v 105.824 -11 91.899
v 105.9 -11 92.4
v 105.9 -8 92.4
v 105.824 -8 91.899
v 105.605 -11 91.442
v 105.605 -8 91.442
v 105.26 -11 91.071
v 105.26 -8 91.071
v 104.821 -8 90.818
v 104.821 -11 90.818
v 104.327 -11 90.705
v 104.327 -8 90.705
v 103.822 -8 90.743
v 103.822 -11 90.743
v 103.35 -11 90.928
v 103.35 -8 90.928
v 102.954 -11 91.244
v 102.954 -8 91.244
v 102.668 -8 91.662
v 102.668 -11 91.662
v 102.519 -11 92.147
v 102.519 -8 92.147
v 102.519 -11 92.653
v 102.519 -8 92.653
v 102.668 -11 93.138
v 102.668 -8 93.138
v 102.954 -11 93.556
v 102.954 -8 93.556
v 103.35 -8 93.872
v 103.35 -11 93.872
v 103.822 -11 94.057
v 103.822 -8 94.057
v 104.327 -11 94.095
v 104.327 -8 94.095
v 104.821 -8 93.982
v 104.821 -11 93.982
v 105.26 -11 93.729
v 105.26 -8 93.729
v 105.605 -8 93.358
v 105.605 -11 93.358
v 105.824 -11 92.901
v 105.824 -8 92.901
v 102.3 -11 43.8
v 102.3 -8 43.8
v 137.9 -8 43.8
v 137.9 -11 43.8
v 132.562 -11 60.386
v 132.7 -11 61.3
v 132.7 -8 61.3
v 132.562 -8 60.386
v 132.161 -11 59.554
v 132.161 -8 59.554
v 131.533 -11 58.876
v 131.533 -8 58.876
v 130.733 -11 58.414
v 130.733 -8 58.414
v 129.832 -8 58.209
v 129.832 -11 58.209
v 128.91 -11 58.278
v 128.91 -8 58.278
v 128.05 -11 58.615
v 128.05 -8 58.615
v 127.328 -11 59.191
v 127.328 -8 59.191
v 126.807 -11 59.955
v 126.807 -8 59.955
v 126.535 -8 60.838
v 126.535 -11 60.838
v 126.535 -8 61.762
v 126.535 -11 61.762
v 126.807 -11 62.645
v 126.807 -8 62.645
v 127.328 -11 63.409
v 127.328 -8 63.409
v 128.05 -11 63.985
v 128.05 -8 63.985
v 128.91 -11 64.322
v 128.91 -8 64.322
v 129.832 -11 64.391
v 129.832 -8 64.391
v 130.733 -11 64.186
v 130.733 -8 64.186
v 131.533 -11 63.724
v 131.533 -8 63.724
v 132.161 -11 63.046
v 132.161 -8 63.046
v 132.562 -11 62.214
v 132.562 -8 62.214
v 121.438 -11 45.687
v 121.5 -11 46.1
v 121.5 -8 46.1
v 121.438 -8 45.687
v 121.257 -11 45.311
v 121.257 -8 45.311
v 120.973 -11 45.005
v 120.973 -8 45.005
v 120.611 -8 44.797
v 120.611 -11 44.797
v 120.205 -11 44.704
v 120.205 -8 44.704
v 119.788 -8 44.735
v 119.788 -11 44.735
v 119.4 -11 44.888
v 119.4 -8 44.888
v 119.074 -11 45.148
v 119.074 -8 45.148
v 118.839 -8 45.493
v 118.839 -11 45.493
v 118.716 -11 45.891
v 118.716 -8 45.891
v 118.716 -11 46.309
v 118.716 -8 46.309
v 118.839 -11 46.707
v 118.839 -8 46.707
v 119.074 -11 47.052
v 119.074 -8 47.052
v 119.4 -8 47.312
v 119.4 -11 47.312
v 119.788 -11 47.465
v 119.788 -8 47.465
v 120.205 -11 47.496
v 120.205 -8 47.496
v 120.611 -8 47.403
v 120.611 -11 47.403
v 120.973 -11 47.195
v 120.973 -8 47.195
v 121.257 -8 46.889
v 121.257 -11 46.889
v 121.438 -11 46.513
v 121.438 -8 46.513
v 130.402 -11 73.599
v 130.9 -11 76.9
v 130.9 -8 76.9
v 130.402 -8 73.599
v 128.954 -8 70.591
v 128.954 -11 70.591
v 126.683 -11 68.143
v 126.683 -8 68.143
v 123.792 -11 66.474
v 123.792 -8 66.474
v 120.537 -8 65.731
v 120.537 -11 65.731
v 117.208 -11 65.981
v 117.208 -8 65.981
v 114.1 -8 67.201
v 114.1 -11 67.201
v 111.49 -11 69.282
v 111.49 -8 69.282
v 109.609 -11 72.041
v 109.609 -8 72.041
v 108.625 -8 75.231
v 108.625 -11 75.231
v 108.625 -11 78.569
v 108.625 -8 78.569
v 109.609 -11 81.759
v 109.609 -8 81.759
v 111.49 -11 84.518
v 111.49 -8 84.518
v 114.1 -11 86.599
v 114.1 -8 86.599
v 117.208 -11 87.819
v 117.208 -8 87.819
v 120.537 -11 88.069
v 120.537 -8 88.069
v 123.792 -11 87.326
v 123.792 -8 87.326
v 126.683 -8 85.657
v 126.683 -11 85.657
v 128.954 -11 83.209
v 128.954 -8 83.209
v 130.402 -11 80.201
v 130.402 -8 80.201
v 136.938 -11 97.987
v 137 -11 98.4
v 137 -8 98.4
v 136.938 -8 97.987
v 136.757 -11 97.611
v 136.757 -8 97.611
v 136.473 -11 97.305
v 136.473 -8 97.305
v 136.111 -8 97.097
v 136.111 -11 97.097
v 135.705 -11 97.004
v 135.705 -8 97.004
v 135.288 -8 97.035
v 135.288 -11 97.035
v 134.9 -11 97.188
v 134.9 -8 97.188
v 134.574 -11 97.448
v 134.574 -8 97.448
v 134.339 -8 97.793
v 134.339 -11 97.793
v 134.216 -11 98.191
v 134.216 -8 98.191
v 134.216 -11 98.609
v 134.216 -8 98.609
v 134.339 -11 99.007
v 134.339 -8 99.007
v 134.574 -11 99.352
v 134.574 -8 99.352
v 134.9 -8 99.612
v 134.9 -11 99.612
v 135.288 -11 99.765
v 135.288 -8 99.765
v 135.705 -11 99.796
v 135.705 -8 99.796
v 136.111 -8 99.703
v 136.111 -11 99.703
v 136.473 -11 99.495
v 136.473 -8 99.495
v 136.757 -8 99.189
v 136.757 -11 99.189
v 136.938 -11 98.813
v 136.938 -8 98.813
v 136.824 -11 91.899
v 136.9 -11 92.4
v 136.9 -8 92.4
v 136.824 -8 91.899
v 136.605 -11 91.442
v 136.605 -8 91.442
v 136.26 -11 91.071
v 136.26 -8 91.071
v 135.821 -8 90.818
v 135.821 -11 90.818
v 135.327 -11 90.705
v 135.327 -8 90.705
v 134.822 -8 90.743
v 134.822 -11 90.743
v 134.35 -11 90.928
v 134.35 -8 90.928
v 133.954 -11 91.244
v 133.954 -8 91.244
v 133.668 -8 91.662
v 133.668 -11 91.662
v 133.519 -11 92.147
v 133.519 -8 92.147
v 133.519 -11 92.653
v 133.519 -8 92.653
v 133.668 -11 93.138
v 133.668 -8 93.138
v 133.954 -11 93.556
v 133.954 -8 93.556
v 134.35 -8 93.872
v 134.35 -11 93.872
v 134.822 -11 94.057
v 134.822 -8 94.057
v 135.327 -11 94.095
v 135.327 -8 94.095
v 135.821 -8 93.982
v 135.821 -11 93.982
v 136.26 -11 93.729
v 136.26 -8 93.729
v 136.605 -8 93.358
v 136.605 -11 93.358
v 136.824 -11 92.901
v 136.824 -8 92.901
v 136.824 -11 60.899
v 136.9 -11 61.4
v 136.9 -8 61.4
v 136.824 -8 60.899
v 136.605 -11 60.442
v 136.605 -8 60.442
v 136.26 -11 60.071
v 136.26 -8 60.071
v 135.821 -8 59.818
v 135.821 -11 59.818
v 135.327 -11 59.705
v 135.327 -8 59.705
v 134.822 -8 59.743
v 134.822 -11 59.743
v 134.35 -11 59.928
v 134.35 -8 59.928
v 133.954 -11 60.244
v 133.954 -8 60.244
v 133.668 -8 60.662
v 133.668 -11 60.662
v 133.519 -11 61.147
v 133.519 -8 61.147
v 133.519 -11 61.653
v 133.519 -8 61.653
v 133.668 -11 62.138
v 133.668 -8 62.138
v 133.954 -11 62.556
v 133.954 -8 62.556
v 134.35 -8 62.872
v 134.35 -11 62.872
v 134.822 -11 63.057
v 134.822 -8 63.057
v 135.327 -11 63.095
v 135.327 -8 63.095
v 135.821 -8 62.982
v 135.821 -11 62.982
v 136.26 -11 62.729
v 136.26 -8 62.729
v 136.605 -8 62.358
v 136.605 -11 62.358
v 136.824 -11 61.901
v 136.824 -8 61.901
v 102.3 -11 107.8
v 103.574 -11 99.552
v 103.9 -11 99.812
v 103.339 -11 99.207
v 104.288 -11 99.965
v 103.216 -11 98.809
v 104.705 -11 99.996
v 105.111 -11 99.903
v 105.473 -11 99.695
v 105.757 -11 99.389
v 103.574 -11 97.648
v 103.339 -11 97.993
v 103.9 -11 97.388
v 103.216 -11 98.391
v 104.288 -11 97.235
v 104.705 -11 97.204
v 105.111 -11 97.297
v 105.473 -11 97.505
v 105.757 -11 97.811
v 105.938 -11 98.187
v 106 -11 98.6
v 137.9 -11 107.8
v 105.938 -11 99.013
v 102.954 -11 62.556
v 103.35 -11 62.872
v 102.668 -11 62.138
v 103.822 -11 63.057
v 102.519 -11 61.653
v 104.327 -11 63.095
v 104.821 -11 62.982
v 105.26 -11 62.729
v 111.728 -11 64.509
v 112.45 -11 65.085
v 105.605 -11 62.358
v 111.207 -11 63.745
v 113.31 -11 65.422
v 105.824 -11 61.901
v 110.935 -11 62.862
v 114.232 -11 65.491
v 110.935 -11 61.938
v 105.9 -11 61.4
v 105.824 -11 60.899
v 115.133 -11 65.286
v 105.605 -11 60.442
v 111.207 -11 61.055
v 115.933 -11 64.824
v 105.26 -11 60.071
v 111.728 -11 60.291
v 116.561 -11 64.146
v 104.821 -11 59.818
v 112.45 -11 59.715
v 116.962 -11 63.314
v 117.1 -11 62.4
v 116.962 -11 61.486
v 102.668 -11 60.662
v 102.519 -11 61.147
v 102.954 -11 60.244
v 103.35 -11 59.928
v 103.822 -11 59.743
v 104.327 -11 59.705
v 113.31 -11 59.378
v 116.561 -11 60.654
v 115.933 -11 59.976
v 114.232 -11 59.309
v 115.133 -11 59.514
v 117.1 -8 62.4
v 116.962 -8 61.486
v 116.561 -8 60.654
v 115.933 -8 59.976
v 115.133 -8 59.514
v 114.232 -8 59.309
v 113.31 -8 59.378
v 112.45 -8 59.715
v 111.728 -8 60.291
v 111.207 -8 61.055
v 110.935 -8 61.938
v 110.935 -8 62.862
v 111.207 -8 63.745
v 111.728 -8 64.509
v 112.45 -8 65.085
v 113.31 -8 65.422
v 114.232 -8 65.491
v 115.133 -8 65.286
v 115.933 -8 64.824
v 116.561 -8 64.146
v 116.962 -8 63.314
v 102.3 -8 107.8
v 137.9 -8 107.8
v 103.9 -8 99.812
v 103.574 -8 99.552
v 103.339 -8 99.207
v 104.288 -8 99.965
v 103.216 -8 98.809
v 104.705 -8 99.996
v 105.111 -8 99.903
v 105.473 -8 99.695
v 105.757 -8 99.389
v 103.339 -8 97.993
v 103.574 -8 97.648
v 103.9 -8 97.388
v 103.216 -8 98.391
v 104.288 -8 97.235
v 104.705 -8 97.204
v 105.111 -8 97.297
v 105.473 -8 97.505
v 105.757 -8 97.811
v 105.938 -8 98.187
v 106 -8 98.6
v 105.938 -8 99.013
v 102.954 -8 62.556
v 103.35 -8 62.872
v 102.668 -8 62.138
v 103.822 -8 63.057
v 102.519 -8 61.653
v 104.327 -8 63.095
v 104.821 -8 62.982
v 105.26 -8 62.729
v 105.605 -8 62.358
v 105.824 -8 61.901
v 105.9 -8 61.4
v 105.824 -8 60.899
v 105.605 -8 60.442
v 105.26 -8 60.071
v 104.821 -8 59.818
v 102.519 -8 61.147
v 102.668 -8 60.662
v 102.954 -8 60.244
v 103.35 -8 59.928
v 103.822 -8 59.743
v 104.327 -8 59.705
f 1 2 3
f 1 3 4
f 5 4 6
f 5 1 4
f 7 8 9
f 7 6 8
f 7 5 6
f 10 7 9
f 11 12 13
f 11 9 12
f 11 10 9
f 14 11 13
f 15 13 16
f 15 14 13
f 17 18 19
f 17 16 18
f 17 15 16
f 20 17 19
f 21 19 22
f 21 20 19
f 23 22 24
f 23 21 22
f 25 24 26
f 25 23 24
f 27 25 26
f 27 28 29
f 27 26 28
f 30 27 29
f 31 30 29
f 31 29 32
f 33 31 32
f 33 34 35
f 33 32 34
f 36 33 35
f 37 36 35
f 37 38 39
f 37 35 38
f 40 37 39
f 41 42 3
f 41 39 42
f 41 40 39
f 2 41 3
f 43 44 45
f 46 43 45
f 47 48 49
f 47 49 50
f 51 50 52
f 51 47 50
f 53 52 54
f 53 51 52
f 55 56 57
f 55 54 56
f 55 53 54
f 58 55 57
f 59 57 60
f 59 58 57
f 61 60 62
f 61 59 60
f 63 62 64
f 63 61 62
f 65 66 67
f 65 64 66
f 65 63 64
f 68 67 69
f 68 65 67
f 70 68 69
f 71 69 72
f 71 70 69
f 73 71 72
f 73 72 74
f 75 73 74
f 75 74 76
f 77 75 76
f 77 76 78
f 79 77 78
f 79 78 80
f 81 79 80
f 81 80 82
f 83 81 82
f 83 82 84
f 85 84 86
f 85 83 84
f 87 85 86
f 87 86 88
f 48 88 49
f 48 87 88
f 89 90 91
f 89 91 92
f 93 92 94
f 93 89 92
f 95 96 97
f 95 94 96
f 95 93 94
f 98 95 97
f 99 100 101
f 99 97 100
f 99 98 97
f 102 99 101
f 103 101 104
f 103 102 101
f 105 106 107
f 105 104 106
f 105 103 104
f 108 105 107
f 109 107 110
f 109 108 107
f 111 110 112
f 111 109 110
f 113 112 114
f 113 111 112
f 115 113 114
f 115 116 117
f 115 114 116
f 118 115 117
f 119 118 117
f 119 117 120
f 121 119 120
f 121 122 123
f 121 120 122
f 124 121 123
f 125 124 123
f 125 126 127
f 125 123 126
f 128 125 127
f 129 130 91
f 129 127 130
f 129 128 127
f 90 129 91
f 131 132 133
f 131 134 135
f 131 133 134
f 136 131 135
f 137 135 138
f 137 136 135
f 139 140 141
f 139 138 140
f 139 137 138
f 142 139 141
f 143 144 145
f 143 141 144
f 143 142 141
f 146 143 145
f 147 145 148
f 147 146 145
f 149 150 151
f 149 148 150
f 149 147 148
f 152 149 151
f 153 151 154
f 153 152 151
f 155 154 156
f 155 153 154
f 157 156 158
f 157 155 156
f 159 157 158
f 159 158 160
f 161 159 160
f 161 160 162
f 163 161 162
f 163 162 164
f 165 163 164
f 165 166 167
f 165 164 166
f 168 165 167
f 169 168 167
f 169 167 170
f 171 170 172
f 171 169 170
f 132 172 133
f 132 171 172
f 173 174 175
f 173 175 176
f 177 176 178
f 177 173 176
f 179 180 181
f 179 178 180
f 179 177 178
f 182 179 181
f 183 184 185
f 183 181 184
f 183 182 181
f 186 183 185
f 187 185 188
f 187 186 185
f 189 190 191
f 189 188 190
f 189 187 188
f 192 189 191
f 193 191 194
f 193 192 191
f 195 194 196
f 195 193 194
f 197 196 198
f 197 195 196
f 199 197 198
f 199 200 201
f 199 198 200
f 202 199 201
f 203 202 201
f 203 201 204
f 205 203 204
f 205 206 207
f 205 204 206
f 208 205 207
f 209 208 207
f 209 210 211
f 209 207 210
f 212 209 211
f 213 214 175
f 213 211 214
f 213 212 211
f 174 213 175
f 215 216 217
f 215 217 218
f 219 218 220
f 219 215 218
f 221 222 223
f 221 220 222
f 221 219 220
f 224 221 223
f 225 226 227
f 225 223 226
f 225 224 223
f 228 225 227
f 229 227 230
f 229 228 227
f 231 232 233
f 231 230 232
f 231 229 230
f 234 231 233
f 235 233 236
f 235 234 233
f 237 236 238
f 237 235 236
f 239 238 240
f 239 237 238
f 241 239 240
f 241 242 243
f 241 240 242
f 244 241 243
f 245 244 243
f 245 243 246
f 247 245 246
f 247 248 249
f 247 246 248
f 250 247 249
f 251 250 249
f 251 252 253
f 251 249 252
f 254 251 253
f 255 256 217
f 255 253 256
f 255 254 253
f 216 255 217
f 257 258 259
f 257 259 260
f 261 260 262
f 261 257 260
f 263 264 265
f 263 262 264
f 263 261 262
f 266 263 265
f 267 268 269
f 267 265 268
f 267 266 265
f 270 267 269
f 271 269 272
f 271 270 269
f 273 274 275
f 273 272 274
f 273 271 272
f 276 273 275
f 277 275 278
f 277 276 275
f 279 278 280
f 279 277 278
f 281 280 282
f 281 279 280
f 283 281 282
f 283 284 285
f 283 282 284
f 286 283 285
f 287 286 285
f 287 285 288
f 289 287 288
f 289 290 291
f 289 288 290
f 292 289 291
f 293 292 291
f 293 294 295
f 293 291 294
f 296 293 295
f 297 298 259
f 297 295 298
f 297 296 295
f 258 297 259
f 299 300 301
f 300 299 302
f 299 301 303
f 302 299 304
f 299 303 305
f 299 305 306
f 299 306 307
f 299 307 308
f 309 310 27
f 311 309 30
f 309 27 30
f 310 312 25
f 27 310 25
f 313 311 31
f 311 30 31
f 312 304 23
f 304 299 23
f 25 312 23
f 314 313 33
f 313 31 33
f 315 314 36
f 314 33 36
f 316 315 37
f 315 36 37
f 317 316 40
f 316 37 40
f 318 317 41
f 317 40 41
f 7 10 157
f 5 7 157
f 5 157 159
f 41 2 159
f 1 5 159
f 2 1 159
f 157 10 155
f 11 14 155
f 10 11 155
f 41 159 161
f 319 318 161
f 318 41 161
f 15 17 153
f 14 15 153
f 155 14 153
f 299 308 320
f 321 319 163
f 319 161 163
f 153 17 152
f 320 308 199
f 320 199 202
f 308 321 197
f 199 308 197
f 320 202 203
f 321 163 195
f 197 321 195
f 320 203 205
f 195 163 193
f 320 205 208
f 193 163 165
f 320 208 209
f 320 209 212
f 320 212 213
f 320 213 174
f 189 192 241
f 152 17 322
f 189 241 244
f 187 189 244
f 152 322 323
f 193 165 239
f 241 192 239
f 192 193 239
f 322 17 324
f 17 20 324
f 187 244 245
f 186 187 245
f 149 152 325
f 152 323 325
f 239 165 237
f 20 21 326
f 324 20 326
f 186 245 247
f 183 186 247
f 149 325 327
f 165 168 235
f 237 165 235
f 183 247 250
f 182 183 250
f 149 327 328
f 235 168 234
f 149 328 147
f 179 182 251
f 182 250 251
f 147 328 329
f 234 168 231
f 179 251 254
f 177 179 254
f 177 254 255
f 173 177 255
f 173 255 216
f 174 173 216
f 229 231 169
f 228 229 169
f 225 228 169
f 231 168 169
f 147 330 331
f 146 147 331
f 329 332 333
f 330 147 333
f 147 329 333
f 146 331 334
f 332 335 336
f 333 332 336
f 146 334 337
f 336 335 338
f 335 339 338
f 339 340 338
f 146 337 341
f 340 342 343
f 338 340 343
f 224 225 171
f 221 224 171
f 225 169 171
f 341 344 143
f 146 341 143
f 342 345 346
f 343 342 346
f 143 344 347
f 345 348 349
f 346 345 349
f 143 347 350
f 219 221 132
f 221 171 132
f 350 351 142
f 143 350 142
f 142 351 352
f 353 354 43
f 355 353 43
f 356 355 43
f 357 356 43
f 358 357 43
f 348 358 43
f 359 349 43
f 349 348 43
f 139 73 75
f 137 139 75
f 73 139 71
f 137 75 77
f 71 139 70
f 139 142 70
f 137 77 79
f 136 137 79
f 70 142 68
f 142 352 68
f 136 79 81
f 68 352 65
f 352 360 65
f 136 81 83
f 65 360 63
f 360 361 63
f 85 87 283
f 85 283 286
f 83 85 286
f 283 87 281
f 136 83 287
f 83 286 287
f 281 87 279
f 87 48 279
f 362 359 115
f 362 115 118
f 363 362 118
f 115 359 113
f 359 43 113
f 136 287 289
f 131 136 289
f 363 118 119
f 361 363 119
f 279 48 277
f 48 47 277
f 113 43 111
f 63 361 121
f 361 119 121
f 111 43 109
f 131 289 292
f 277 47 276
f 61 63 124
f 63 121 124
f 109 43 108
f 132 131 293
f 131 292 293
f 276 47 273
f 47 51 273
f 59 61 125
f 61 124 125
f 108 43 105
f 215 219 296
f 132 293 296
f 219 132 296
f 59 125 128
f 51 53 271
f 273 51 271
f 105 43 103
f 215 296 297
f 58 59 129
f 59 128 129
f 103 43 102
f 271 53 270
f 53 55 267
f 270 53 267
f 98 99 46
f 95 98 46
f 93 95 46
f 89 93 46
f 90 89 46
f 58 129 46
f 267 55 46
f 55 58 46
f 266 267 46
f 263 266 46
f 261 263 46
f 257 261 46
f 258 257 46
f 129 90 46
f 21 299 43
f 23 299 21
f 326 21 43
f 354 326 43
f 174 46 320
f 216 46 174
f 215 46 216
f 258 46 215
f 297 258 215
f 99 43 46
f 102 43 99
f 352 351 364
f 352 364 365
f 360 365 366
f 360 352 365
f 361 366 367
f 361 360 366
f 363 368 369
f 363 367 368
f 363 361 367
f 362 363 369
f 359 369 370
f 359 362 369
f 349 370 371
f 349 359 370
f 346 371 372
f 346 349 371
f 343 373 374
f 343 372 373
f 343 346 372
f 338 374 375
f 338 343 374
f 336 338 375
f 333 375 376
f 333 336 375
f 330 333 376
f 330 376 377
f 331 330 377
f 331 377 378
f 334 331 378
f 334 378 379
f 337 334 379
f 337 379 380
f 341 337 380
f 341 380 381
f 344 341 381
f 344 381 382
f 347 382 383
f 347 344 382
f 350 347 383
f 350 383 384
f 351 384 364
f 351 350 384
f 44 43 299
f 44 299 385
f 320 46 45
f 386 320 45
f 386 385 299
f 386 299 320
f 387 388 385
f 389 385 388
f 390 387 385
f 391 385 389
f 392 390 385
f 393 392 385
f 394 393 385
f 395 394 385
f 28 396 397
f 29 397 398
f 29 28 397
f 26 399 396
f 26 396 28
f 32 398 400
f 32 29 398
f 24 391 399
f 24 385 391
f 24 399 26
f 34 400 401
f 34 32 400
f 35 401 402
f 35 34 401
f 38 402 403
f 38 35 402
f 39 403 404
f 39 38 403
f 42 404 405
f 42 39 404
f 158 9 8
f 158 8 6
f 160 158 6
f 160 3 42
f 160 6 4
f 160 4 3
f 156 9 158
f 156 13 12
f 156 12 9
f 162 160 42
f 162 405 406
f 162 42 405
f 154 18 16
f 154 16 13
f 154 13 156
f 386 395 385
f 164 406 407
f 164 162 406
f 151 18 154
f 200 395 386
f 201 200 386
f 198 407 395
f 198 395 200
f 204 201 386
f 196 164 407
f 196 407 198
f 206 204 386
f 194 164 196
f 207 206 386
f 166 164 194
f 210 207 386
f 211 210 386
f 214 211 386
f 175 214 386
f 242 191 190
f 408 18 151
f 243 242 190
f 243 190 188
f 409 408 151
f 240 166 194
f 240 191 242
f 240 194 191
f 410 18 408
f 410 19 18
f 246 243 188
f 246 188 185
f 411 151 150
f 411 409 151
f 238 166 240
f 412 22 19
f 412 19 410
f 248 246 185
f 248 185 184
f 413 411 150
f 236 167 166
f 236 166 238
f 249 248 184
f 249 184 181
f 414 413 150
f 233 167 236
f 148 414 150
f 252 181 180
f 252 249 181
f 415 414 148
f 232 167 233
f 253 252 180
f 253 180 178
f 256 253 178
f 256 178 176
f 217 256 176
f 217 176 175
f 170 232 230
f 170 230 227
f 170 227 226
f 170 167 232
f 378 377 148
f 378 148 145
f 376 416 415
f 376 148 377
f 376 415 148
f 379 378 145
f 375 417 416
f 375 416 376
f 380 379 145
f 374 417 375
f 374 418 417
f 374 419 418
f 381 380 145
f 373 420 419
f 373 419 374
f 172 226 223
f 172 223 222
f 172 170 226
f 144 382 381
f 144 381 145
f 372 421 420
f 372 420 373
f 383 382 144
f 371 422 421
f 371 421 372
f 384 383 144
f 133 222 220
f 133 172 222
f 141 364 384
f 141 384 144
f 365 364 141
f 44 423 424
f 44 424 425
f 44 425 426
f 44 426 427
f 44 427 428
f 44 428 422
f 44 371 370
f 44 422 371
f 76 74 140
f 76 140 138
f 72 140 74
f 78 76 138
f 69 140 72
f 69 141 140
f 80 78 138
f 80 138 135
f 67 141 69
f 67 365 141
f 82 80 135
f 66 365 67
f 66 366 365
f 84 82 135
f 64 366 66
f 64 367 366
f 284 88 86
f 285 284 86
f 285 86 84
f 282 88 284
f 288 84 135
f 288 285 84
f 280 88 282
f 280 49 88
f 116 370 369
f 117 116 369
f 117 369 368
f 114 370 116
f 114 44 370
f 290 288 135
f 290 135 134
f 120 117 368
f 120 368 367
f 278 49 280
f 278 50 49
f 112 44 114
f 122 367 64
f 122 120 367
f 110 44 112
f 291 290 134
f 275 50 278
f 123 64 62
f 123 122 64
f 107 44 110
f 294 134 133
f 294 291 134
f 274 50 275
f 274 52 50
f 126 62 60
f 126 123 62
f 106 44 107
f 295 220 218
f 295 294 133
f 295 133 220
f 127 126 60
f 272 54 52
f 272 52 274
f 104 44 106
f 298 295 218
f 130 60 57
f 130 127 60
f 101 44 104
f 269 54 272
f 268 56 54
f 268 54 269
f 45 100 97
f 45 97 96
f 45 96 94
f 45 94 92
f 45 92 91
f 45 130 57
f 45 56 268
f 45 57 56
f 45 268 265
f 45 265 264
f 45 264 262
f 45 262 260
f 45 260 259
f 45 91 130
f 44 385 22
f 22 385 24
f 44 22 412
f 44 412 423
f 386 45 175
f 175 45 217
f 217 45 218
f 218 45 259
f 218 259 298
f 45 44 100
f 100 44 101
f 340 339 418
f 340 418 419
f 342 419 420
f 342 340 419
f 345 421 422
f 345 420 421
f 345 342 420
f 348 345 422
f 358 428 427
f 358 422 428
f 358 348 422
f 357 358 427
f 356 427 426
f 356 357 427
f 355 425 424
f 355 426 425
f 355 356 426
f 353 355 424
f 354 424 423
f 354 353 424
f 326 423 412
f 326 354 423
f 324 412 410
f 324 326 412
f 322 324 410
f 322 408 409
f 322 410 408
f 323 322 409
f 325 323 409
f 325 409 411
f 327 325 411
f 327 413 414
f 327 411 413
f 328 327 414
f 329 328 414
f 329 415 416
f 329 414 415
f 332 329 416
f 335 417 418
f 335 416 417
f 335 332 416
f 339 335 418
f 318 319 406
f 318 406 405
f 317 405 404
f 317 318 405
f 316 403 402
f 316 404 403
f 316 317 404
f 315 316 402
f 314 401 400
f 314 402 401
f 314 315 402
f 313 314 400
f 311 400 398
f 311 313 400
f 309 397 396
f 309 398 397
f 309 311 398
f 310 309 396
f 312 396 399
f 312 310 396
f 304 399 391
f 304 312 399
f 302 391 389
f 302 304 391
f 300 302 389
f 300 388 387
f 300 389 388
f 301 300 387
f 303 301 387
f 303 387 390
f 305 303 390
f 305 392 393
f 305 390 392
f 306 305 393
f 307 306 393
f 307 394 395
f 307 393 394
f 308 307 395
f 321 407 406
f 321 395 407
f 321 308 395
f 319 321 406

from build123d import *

# Parameters (mm, degrees)
CYLINDER229_R     = 11.2
CYLINDER229_DEPTH = 10
CYLINDER223_R     = 1.7
CYLINDER223_DEPTH = 10
CYLINDER221_R     = 1.4
CYLINDER221_DEPTH = 10
CYLINDER220_R     = 1.7
CYLINDER220_DEPTH = 10
CYLINDER224_R     = 1.7
CYLINDER224_DEPTH = 10
CYLINDER222_R     = 1.7
CYLINDER222_DEPTH = 10
CYLINDER226_R     = 1.4
CYLINDER226_DEPTH = 10
CYLINDER225_R     = 1.4
CYLINDER225_DEPTH = 10
CYLINDER215_R     = 3.1
CYLINDER215_DEPTH = 28
CYLINDER214_R     = 3.1
CYLINDER214_DEPTH = 28
BOX081_W          = 35.6
BOX081_H          = 3
BOX081_DEPTH      = 64


with BuildPart() as cylinder229:
    # Cylinder229 → Cylinder229 (new body)
    with BuildSketch(Plane(origin=(119.7, -14.3, 76.9), x_dir=(1, 0, 0), z_dir=(0, 1, 0))):
        Circle(CYLINDER229_R)
    extrude(amount=CYLINDER229_DEPTH)


with BuildPart() as cylinder223:
    # Cylinder223 → Cylinder223 (new body)
    with BuildSketch(Plane(origin=(135.2, -15, 61.4), x_dir=(1, 0, 0), z_dir=(0, 1, 0))):
        Circle(CYLINDER223_R)
    extrude(amount=CYLINDER223_DEPTH)


with BuildPart() as cylinder221:
    # Cylinder221 → Cylinder221 (new body)
    with BuildSketch(Plane(origin=(120.1, -15, 46.1), x_dir=(1, 0, 0), z_dir=(0, 1, 0))):
        Circle(CYLINDER221_R)
    extrude(amount=CYLINDER221_DEPTH)


with BuildPart() as cylinder220:
    # Cylinder220 → Cylinder220 (new body)
    with BuildSketch(Plane(origin=(104.2, -15, 61.4), x_dir=(1, 0, 0), z_dir=(0, 1, 0))):
        Circle(CYLINDER220_R)
    extrude(amount=CYLINDER220_DEPTH)


with BuildPart() as cylinder224:
    # Cylinder224 → Cylinder224 (new body)
    with BuildSketch(Plane(origin=(104.2, -15, 92.4), x_dir=(1, 0, 0), z_dir=(0, 1, 0))):
        Circle(CYLINDER224_R)
    extrude(amount=CYLINDER224_DEPTH)


with BuildPart() as cylinder222:
    # Cylinder222 → Cylinder222 (new body)
    with BuildSketch(Plane(origin=(135.2, -15, 92.4), x_dir=(1, 0, 0), z_dir=(0, 1, 0))):
        Circle(CYLINDER222_R)
    extrude(amount=CYLINDER222_DEPTH)


with BuildPart() as cylinder226:
    # Cylinder226 → Cylinder226 (new body)
    with BuildSketch(Plane(origin=(135.6, -15, 98.4), x_dir=(1, 0, 0), z_dir=(0, 1, 0))):
        Circle(CYLINDER226_R)
    extrude(amount=CYLINDER226_DEPTH)


with BuildPart() as cylinder225:
    # Cylinder225 → Cylinder225 (new body)
    with BuildSketch(Plane(origin=(104.6, -15, 98.6), x_dir=(1, 0, 0), z_dir=(0, 1, 0))):
        Circle(CYLINDER225_R)
    extrude(amount=CYLINDER225_DEPTH)


with BuildPart() as cylinder215:
    # Cylinder215 → Cylinder215 (new body)
    with BuildSketch(Plane(origin=(129.6, -11.9, 61.3), x_dir=(1, 0, 0), z_dir=(0, 1, 0))):
        Circle(CYLINDER215_R)
    extrude(amount=CYLINDER215_DEPTH)


with BuildPart() as cylinder214:
    # Cylinder214 → Cylinder214 (new body)
    with BuildSketch(Plane(origin=(114, -11.9, 62.4), x_dir=(1, 0, 0), z_dir=(0, 1, 0))):
        Circle(CYLINDER214_R)
    extrude(amount=CYLINDER214_DEPTH)


with BuildPart() as cut269:
    # Box081 → Box081 (new body)
    with BuildSketch(Plane(origin=(102.3, -11, 43.8), x_dir=(1, 0, 0), z_dir=(0, 0, 1))):
        with Locations((17.8, 1.5)):
            Rectangle(BOX081_W, BOX081_H)
    extrude(amount=BOX081_DEPTH)

    # Cut260: cut Cylinder214
    add(cylinder214.part, mode=Mode.SUBTRACT)

    # Cut261: cut Cylinder215
    add(cylinder215.part, mode=Mode.SUBTRACT)

    # Cut262: cut Cylinder225
    add(cylinder225.part, mode=Mode.SUBTRACT)

    # Cut263: cut Cylinder226
    add(cylinder226.part, mode=Mode.SUBTRACT)

    # Cut264: cut Cylinder222
    add(cylinder222.part, mode=Mode.SUBTRACT)

    # Cut265: cut Cylinder224
    add(cylinder224.part, mode=Mode.SUBTRACT)

    # Cut266: cut Cylinder220
    add(cylinder220.part, mode=Mode.SUBTRACT)

    # Cut267: cut Cylinder221
    add(cylinder221.part, mode=Mode.SUBTRACT)

    # Cut268: cut Cylinder223
    add(cylinder223.part, mode=Mode.SUBTRACT)

    # Cut269: cut Cylinder229
    add(cylinder229.part, mode=Mode.SUBTRACT)


solid = cut269.part
